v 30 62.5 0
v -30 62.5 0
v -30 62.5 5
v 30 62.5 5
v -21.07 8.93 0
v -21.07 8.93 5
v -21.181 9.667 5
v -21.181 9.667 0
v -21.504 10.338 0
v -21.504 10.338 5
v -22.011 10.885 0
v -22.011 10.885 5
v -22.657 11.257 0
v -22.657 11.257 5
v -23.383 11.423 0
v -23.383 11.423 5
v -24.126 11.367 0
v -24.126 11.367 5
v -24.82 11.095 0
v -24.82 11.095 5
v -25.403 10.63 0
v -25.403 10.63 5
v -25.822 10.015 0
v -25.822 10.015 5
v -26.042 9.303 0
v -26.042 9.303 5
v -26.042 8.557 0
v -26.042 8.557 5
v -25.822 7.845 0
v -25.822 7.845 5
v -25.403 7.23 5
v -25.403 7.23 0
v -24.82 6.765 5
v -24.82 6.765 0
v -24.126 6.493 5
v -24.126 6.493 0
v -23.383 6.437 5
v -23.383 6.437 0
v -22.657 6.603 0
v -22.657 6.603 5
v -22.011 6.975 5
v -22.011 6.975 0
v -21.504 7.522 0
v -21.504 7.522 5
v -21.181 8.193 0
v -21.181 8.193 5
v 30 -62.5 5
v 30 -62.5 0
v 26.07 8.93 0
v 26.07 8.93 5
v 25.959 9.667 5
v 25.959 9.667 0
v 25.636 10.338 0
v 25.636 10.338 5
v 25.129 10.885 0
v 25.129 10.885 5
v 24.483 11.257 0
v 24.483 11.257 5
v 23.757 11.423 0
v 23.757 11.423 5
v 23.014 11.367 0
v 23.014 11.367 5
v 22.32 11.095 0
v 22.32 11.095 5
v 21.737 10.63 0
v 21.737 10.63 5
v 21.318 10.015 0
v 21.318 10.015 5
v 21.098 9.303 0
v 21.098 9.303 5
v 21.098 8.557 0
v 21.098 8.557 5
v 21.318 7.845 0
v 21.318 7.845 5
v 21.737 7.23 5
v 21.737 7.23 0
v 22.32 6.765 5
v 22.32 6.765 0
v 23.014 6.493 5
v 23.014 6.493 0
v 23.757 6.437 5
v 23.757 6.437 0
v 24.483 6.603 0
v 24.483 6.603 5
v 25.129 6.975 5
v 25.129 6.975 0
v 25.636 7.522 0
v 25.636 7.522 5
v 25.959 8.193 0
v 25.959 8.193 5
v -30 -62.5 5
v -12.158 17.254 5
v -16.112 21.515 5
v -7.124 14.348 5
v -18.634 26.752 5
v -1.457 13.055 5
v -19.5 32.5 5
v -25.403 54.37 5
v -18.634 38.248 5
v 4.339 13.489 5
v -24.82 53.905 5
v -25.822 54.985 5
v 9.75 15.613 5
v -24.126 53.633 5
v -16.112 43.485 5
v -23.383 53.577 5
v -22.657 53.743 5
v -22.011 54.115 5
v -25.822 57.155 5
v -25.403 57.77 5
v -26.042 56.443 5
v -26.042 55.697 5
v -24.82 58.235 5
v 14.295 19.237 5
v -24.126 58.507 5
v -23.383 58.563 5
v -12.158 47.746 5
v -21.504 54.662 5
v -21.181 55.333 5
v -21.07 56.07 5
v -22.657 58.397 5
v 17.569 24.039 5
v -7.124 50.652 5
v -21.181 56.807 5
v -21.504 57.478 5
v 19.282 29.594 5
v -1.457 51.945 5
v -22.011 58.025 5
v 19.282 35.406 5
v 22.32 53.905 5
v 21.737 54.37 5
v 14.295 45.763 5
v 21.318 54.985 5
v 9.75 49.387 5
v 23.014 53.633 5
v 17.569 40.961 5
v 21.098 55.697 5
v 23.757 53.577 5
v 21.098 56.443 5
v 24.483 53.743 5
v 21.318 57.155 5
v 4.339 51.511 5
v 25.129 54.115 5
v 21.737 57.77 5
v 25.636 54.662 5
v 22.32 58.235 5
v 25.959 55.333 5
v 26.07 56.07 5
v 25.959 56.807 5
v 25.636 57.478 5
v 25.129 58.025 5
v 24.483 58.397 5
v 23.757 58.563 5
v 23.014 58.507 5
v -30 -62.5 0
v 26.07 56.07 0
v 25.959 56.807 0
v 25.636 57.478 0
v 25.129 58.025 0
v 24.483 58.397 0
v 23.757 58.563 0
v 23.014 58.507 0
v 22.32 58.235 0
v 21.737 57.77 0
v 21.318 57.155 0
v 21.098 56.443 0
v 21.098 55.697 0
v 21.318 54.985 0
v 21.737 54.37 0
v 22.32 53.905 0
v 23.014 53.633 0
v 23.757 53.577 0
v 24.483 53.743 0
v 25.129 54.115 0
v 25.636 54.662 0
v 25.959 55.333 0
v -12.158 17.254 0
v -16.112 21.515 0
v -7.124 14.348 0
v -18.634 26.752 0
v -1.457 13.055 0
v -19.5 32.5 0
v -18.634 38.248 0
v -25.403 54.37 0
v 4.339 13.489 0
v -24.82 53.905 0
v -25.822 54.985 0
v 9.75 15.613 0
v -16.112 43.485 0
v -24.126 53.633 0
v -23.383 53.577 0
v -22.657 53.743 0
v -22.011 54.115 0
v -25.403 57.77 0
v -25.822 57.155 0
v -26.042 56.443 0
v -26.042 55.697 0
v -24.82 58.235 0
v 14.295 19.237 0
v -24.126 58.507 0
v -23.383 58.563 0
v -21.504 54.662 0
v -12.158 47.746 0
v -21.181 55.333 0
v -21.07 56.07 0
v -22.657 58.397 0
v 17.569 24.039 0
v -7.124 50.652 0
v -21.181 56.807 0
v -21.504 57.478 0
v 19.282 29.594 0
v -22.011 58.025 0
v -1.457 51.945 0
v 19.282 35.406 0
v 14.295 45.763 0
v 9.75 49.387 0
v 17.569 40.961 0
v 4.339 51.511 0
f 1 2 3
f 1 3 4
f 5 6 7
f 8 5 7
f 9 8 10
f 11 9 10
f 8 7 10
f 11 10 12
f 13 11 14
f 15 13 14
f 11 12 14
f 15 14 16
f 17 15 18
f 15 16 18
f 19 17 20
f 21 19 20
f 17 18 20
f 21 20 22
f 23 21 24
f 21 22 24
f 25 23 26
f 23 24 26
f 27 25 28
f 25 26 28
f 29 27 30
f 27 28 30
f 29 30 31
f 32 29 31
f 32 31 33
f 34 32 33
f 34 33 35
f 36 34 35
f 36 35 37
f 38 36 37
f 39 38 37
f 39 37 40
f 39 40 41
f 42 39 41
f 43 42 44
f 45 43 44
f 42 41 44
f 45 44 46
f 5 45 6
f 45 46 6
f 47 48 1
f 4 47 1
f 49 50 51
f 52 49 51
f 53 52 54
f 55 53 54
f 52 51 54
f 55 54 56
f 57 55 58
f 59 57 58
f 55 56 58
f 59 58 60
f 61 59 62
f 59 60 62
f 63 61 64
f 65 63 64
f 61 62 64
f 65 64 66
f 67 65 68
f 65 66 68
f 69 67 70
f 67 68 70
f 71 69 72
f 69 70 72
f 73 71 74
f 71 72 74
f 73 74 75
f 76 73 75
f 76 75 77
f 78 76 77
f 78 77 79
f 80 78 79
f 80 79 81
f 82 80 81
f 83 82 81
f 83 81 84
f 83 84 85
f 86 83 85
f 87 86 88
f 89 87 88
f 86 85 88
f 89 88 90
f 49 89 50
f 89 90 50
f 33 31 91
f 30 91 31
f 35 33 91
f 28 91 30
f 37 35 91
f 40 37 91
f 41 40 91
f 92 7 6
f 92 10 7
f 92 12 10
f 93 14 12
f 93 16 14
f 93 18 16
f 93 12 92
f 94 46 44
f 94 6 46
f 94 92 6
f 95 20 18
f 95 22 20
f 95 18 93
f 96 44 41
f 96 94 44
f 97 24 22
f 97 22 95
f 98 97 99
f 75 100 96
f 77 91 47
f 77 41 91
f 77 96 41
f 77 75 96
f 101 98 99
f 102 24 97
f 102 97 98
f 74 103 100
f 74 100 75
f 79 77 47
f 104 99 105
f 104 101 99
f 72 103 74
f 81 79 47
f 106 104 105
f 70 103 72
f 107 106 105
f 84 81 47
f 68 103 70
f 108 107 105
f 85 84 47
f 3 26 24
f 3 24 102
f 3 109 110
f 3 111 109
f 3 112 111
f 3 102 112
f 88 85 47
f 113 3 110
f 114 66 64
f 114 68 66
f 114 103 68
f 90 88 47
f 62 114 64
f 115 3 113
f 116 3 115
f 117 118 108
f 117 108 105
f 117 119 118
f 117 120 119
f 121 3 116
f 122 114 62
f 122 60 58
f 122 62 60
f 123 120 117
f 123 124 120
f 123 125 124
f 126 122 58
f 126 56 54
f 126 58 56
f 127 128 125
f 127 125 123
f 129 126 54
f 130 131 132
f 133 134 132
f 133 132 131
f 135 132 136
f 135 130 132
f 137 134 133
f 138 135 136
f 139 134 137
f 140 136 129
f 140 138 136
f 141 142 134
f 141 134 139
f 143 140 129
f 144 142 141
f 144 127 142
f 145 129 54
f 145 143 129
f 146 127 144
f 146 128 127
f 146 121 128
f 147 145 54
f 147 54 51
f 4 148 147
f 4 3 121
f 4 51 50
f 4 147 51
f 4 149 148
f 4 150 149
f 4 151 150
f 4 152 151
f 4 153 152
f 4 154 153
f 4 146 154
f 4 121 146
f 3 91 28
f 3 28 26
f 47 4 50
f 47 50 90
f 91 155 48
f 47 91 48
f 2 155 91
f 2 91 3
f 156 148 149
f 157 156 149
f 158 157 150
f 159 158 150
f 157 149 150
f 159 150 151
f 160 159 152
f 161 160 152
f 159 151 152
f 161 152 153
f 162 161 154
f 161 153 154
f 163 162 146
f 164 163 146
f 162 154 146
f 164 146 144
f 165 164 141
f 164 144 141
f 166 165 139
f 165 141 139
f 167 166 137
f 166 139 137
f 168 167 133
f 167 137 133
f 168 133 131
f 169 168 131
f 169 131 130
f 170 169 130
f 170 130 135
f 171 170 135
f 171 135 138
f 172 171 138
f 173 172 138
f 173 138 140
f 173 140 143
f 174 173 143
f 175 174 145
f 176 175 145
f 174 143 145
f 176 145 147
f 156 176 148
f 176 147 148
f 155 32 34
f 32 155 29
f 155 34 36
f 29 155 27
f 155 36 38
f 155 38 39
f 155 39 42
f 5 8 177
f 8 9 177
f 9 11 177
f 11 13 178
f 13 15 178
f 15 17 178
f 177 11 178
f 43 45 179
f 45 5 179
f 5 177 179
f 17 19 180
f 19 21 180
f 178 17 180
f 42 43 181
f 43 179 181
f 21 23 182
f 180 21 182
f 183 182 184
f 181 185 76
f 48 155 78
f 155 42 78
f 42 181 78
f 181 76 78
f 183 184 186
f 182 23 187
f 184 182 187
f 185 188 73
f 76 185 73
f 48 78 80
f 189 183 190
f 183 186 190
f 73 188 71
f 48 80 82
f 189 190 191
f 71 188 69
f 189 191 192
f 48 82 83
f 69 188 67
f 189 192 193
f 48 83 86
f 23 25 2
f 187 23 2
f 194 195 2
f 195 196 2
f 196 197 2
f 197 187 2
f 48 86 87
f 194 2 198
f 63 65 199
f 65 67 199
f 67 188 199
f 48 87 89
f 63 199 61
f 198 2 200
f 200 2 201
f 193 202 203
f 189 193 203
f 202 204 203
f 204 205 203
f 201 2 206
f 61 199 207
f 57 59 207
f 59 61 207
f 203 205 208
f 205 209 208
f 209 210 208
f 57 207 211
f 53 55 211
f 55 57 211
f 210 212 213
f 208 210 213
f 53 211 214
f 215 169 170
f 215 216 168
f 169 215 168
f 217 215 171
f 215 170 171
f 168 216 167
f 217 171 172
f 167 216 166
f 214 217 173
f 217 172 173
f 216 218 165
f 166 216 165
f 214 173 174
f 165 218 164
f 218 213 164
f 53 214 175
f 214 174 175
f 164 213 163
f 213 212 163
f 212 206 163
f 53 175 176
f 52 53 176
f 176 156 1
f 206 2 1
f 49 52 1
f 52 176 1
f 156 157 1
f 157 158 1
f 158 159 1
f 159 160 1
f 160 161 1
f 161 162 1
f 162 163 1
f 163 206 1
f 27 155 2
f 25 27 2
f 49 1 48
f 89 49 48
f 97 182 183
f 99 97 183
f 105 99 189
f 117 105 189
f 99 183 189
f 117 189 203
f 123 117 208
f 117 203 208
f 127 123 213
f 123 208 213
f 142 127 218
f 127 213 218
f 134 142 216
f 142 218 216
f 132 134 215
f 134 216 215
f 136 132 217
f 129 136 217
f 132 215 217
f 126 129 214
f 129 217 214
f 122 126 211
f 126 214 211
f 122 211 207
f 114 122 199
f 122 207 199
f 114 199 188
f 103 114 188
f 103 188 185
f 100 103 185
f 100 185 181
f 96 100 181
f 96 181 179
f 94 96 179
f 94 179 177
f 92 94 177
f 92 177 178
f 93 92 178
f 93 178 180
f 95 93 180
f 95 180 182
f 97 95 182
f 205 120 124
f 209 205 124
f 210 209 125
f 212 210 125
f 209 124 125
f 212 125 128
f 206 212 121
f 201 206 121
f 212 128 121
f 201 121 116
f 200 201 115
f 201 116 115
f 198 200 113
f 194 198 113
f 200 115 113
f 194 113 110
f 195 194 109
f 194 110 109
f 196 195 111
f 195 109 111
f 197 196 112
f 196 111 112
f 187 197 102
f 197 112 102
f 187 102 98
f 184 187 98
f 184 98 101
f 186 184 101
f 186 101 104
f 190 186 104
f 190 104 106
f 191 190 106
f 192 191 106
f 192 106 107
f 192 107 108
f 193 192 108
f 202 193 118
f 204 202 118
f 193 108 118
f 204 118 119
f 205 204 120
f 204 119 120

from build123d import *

# Parameters (mm, degrees)
SKETCH_1_W          = 60
SKETCH_1_H          = 125
EXTRUDE_1_DEPTH     = 5
SKETCH_4_R          = 19.5
CUT_EXTRUDE_2_DEPTH = 10
SKETCH_2_R          = 2.5
CUT_EXTRUDE_1_DEPTH = 5


with BuildPart() as part:
    # 스케치1 → 보스-돌출1 (new body)
    with BuildSketch(Plane.XY):
        Rectangle(SKETCH_1_W, SKETCH_1_H)
    extrude(amount=EXTRUDE_1_DEPTH)

    # 스케치4 → 컷-돌출2 (cut)
    with BuildSketch(Plane(origin=(0, 0, 0), x_dir=(-1, 0, 0), z_dir=(0, 0, -1))):
        with Locations((0, 32.5)):
            Circle(SKETCH_4_R)
    extrude(amount=-CUT_EXTRUDE_2_DEPTH, mode=Mode.SUBTRACT)

    # 스케치2 → 컷-돌출1 (cut)
    with BuildSketch(Plane.XY.offset(5)):
        with Locations((23.57, 56.07)):
            Circle(SKETCH_2_R)
        with Locations((23.57, 8.93)):
            Circle(SKETCH_2_R)
        with Locations((-23.57, 8.93)):
            Circle(SKETCH_2_R)
        with Locations((-23.57, 56.07)):
            Circle(SKETCH_2_R)
    extrude(amount=-CUT_EXTRUDE_1_DEPTH, mode=Mode.SUBTRACT)


solid = part.part
